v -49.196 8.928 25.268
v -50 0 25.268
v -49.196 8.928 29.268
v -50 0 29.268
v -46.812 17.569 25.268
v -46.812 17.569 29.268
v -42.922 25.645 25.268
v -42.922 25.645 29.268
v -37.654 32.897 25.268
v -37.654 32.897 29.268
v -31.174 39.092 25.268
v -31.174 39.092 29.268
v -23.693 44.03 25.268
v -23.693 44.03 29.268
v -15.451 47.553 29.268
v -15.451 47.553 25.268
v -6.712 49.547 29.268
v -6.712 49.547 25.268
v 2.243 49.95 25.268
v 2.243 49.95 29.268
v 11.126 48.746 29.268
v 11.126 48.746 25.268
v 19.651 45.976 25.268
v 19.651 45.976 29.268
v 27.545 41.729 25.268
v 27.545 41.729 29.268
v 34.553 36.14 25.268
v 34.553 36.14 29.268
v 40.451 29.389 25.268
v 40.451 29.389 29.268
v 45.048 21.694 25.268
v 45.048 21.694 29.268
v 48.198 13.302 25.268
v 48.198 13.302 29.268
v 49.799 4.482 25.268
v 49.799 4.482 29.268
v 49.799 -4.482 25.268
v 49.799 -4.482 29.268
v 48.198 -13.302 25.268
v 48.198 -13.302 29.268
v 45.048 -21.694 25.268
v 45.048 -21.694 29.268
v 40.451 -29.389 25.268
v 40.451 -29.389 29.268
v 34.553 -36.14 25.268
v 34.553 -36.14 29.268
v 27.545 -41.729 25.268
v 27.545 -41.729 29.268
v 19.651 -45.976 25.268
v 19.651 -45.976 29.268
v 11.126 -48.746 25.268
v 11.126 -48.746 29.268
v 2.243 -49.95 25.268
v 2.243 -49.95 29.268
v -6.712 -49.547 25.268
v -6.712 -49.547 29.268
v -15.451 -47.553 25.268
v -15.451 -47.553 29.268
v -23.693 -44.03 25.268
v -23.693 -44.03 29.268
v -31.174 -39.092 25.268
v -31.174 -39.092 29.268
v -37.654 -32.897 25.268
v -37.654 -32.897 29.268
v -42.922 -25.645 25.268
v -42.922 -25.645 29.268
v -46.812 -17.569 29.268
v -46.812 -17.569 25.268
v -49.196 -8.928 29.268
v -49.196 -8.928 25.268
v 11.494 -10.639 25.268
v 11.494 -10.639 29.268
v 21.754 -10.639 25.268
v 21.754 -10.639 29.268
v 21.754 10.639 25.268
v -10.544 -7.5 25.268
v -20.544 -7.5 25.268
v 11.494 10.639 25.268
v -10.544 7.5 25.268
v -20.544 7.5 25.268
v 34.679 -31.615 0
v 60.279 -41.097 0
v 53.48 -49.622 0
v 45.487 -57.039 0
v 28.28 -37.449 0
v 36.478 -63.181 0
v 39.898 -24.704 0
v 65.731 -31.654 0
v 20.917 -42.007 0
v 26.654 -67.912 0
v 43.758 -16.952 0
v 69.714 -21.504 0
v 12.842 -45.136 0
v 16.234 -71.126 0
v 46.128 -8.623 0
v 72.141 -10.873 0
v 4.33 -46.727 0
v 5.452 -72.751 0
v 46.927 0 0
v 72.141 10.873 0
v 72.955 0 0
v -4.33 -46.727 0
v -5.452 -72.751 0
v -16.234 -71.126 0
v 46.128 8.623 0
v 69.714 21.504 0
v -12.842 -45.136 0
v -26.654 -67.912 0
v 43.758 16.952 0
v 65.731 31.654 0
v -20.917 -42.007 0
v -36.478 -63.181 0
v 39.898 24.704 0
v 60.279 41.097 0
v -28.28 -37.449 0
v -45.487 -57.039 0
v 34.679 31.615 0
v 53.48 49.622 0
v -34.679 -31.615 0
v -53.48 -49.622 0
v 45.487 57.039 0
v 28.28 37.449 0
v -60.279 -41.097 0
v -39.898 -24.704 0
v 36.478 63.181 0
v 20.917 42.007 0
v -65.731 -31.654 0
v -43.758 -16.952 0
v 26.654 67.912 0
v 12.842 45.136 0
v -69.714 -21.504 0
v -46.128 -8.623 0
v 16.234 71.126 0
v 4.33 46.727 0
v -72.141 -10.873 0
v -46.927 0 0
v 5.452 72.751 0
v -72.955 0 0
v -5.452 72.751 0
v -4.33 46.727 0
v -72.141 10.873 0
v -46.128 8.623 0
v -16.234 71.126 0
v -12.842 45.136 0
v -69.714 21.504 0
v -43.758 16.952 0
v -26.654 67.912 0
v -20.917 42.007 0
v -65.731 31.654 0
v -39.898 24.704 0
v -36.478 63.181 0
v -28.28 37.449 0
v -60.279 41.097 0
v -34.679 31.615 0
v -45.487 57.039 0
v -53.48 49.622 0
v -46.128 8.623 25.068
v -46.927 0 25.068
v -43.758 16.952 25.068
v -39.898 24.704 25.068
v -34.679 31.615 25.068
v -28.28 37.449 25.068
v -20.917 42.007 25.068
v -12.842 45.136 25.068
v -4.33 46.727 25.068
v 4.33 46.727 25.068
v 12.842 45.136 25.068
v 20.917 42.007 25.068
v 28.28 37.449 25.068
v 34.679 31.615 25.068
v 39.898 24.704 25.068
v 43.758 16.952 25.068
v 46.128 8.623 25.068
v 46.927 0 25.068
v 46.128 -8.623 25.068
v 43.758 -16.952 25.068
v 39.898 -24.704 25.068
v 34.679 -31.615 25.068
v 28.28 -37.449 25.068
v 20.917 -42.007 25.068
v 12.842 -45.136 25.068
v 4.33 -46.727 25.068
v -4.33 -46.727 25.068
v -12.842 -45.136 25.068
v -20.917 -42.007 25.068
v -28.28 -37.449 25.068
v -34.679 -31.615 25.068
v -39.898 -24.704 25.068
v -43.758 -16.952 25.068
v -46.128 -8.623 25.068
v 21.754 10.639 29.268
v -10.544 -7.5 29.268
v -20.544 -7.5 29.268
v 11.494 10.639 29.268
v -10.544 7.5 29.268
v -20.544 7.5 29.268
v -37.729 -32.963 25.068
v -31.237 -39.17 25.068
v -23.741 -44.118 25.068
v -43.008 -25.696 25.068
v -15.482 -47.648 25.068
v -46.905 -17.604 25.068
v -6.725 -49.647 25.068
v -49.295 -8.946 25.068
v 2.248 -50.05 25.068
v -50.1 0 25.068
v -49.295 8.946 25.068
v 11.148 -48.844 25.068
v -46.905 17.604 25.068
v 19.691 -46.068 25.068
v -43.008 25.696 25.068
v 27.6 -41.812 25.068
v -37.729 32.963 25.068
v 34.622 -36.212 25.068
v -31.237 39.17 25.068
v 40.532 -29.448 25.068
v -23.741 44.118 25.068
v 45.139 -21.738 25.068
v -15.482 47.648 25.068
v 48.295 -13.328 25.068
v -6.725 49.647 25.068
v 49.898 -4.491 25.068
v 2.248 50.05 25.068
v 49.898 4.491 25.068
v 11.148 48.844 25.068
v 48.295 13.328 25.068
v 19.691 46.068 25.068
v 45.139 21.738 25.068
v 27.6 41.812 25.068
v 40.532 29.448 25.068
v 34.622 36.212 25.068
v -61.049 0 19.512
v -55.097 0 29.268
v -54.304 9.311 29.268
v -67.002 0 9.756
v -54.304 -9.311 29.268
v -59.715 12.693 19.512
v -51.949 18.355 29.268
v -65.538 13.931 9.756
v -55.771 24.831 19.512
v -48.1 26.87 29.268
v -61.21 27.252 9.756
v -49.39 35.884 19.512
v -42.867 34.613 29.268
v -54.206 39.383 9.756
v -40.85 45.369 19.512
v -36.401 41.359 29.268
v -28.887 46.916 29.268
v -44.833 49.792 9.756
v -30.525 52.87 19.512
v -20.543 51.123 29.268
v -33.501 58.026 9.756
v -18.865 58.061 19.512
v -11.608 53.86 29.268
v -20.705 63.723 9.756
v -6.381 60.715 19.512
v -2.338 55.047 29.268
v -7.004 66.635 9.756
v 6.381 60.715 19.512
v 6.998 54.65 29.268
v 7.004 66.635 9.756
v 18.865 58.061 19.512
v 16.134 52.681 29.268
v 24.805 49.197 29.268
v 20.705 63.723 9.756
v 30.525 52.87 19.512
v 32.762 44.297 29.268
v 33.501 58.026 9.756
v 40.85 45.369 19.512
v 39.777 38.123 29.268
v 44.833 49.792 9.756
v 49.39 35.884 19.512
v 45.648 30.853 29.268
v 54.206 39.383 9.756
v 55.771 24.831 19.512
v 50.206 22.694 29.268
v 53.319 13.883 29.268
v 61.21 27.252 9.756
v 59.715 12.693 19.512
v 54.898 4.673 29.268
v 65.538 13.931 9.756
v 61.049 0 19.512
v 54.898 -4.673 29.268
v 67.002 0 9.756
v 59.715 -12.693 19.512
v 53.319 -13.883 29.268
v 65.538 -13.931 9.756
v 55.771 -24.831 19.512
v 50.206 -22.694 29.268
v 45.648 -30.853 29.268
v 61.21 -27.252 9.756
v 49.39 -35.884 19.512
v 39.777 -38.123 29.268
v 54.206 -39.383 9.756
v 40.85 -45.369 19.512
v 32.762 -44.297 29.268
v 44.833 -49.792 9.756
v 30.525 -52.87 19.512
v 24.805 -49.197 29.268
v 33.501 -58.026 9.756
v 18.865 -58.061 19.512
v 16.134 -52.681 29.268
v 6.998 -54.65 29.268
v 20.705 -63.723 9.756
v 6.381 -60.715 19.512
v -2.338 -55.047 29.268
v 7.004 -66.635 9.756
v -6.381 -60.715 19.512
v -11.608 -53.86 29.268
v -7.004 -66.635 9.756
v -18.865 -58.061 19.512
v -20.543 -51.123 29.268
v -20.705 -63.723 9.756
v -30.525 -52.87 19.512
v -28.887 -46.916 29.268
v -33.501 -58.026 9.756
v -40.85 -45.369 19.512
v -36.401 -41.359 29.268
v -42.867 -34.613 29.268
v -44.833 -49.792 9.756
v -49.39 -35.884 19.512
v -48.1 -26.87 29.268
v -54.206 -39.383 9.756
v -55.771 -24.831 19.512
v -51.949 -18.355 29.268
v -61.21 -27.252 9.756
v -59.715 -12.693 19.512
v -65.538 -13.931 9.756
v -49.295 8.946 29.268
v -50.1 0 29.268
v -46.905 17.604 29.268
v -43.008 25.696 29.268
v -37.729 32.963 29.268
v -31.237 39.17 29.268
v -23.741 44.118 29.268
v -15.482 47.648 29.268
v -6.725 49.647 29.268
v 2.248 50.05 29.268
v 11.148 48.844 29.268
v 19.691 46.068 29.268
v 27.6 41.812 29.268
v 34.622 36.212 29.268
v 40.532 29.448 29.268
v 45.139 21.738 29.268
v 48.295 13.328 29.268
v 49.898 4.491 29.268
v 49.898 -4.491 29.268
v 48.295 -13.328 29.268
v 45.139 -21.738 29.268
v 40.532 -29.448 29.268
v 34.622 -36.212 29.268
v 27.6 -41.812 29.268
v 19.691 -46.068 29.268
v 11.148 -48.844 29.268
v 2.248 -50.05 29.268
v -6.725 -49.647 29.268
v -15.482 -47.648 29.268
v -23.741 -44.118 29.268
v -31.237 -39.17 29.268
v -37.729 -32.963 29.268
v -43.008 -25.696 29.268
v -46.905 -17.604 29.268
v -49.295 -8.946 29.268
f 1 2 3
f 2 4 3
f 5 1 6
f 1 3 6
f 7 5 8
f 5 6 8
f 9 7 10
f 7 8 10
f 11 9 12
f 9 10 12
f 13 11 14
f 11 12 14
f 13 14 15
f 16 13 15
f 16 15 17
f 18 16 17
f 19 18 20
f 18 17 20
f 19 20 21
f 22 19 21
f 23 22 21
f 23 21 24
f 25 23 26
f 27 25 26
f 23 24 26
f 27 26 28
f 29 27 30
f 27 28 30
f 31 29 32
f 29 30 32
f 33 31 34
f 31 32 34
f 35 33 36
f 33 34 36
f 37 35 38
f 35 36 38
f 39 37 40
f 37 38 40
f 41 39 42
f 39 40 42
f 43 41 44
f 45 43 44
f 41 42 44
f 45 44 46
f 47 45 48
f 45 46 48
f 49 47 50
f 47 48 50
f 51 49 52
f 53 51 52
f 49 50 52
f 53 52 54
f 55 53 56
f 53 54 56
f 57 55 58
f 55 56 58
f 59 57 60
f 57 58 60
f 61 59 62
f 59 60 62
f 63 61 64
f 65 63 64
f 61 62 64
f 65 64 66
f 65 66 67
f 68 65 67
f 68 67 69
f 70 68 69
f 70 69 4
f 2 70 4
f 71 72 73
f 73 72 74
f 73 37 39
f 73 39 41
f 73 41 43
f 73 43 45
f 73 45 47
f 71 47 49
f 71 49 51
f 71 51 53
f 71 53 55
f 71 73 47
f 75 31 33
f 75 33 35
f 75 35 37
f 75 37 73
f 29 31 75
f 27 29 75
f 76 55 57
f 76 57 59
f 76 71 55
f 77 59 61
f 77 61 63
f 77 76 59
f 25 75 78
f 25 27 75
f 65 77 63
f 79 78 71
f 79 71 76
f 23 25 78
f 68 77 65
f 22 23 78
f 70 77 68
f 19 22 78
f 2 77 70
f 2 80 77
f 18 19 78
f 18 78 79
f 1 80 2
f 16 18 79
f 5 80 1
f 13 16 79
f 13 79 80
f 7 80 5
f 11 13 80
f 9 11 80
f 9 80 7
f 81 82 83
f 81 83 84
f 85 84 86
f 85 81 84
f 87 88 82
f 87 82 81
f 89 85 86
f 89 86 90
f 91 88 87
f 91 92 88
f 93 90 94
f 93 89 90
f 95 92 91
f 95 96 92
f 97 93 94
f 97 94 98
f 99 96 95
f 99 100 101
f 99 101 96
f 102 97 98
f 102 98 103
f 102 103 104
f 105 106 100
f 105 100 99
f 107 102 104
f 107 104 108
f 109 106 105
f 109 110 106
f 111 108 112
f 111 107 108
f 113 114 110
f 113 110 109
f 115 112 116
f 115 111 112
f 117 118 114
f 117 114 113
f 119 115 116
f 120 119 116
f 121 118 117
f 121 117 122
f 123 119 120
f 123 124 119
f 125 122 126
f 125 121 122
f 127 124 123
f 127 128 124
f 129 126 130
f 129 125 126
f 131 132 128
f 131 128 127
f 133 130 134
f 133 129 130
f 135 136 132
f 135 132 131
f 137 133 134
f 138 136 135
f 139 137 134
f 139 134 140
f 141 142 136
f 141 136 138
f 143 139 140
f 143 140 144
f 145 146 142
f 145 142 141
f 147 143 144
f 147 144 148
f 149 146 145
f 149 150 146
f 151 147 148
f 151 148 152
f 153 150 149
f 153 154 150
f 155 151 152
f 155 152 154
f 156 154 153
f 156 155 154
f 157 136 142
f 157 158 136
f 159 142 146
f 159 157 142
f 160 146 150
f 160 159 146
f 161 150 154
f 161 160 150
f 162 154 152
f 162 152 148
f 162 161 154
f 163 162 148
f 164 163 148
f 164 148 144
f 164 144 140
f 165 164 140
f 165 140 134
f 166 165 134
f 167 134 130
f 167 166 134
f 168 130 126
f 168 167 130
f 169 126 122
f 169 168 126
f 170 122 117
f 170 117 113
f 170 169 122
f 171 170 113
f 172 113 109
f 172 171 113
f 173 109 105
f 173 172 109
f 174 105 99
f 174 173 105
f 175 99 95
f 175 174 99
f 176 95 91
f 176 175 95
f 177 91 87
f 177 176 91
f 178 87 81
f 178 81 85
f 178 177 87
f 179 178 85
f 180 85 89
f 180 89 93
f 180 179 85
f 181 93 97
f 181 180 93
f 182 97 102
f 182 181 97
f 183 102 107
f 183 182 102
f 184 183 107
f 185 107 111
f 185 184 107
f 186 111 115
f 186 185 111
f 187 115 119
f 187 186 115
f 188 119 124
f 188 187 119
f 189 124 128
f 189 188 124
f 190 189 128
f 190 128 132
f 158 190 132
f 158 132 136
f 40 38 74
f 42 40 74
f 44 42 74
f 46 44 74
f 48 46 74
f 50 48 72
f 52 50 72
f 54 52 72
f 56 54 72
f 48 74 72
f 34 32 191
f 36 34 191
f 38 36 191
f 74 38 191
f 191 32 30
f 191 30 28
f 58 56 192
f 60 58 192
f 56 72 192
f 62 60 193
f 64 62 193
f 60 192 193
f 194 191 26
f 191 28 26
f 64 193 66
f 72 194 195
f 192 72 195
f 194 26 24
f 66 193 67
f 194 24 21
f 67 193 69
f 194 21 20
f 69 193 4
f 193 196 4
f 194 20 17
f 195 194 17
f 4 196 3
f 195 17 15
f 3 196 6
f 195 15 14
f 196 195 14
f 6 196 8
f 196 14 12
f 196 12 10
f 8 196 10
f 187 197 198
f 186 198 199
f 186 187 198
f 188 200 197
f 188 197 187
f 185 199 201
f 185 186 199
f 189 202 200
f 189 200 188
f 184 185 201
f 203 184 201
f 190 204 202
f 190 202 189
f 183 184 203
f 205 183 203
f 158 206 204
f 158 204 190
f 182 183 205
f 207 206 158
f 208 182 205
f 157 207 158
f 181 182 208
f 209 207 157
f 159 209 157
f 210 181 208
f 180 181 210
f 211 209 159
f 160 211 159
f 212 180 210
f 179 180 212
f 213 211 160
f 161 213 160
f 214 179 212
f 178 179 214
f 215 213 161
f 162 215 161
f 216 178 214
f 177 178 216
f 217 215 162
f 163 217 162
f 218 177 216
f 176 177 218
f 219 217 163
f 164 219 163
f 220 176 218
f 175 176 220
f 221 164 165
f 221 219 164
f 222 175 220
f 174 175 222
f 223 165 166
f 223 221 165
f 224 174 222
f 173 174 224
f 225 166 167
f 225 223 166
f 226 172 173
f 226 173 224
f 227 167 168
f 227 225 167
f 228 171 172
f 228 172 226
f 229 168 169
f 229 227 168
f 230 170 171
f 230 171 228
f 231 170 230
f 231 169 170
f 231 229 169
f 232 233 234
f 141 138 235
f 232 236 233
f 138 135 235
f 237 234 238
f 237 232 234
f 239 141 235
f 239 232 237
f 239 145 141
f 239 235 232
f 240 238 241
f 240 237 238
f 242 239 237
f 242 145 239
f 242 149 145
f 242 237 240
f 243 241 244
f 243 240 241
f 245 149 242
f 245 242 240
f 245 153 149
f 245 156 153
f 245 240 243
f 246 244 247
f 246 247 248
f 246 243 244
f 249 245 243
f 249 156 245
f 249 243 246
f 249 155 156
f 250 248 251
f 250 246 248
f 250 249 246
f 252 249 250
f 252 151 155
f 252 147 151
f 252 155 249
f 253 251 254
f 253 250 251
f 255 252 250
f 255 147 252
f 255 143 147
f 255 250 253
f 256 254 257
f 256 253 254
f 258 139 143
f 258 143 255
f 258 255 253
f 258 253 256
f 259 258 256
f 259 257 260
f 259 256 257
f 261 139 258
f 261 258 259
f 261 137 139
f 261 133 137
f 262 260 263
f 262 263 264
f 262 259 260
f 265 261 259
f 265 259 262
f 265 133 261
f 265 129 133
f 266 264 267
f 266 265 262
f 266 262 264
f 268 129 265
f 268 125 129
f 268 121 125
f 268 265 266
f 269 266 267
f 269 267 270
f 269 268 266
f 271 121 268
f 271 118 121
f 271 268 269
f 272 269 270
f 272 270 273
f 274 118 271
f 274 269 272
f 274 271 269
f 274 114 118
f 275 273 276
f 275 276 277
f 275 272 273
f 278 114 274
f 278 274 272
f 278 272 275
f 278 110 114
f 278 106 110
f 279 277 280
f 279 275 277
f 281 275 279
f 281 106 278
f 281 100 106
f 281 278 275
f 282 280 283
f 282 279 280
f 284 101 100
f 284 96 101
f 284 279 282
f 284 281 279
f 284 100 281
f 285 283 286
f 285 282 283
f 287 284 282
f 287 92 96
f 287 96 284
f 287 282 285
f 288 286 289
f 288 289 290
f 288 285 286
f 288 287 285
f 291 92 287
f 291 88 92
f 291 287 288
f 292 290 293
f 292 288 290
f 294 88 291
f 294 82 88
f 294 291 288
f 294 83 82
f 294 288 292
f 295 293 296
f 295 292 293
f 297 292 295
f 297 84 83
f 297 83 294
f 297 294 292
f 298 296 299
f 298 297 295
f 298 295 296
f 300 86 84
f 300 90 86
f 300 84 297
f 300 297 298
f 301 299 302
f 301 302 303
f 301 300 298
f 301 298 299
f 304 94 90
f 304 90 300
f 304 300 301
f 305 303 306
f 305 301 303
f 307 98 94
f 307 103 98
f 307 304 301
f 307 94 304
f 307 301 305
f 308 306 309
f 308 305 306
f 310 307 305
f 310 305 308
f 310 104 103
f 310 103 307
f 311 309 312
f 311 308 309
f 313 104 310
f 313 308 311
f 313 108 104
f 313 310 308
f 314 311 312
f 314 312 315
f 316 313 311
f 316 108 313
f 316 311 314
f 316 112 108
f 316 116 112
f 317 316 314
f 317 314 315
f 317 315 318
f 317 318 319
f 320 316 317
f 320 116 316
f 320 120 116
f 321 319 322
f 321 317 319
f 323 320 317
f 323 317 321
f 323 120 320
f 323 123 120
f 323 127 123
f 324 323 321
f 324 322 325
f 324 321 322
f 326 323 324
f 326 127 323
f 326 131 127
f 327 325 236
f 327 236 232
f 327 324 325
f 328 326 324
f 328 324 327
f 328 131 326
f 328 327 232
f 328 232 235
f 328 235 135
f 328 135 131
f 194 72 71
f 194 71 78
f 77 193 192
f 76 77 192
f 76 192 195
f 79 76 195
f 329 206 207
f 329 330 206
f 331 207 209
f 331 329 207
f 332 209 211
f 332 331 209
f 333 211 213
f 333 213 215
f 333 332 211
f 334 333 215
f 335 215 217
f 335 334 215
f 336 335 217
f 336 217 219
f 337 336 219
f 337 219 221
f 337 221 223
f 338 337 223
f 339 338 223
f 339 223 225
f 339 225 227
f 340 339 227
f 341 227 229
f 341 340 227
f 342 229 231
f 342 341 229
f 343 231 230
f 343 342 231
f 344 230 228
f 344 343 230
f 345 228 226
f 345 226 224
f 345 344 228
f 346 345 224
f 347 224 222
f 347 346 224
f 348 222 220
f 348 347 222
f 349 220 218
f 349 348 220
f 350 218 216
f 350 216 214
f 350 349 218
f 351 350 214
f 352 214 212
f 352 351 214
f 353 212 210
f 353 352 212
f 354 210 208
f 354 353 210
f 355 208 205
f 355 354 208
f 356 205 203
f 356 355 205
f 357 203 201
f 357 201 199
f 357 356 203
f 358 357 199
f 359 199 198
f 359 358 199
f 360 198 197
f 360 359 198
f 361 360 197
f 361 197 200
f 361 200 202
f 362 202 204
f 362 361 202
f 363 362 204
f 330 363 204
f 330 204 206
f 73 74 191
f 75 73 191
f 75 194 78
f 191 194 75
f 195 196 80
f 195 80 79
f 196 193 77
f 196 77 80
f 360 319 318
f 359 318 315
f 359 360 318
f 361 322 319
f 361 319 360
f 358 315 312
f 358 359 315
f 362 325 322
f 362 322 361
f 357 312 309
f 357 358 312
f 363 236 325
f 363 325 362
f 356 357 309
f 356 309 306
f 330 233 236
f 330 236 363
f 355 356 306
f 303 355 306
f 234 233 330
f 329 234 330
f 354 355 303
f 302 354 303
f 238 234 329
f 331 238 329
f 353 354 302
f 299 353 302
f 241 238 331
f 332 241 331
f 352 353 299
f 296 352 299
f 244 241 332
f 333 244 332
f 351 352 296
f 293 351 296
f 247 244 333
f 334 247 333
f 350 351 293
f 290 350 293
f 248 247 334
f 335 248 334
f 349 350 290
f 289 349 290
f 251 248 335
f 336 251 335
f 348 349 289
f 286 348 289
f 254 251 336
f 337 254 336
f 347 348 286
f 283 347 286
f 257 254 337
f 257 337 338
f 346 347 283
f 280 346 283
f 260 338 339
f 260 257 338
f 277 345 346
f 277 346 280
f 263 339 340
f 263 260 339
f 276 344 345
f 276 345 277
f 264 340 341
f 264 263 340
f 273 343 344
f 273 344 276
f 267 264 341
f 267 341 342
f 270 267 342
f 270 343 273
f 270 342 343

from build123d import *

# Parameters (mm, degrees)
F0_W     = 50
F0_H     = 4
F3_W     = 10
F3_H     = 15
F3_W_2   = 10.259356
F3_H_2   = 21.278652
F4_DEPTH = 4


with BuildPart() as f1:
    # F0 (on Front) → F1 (revolve)
    with BuildSketch(Plane.XZ):
        with Locations((-25, 27.268396)):
            Rectangle(F0_W, F0_H)
    revolve(axis=Axis((0, 0, 27.268396), (0, 0, -1)))

    # F3 (on face) → F4 (cut, through all)
    with BuildSketch(Plane.XY.offset(29.268396)):
        with Locations((-15.544331, 0)):
            Rectangle(F3_W, F3_H)
        with Locations((16.623944, 0)):
            Rectangle(F3_W_2, F3_H_2)
    extrude(amount=-F4_DEPTH, mode=Mode.SUBTRACT)


with BuildPart() as f2:
    # F0 (on Front) → F2 (revolve)
    with BuildSketch(Plane.XZ):
        Polygon((-72.95537, 0), (-46.927024, 0), (-46.927024, 25.068396), (-50.1, 25.068396), (-50.1, 29.268396), (-55.096503, 29.268396), align=None)
    revolve(axis=Axis((0, 0, 27.268396), (0, 0, -1)))


solid = Compound([f1.part, f2.part])
